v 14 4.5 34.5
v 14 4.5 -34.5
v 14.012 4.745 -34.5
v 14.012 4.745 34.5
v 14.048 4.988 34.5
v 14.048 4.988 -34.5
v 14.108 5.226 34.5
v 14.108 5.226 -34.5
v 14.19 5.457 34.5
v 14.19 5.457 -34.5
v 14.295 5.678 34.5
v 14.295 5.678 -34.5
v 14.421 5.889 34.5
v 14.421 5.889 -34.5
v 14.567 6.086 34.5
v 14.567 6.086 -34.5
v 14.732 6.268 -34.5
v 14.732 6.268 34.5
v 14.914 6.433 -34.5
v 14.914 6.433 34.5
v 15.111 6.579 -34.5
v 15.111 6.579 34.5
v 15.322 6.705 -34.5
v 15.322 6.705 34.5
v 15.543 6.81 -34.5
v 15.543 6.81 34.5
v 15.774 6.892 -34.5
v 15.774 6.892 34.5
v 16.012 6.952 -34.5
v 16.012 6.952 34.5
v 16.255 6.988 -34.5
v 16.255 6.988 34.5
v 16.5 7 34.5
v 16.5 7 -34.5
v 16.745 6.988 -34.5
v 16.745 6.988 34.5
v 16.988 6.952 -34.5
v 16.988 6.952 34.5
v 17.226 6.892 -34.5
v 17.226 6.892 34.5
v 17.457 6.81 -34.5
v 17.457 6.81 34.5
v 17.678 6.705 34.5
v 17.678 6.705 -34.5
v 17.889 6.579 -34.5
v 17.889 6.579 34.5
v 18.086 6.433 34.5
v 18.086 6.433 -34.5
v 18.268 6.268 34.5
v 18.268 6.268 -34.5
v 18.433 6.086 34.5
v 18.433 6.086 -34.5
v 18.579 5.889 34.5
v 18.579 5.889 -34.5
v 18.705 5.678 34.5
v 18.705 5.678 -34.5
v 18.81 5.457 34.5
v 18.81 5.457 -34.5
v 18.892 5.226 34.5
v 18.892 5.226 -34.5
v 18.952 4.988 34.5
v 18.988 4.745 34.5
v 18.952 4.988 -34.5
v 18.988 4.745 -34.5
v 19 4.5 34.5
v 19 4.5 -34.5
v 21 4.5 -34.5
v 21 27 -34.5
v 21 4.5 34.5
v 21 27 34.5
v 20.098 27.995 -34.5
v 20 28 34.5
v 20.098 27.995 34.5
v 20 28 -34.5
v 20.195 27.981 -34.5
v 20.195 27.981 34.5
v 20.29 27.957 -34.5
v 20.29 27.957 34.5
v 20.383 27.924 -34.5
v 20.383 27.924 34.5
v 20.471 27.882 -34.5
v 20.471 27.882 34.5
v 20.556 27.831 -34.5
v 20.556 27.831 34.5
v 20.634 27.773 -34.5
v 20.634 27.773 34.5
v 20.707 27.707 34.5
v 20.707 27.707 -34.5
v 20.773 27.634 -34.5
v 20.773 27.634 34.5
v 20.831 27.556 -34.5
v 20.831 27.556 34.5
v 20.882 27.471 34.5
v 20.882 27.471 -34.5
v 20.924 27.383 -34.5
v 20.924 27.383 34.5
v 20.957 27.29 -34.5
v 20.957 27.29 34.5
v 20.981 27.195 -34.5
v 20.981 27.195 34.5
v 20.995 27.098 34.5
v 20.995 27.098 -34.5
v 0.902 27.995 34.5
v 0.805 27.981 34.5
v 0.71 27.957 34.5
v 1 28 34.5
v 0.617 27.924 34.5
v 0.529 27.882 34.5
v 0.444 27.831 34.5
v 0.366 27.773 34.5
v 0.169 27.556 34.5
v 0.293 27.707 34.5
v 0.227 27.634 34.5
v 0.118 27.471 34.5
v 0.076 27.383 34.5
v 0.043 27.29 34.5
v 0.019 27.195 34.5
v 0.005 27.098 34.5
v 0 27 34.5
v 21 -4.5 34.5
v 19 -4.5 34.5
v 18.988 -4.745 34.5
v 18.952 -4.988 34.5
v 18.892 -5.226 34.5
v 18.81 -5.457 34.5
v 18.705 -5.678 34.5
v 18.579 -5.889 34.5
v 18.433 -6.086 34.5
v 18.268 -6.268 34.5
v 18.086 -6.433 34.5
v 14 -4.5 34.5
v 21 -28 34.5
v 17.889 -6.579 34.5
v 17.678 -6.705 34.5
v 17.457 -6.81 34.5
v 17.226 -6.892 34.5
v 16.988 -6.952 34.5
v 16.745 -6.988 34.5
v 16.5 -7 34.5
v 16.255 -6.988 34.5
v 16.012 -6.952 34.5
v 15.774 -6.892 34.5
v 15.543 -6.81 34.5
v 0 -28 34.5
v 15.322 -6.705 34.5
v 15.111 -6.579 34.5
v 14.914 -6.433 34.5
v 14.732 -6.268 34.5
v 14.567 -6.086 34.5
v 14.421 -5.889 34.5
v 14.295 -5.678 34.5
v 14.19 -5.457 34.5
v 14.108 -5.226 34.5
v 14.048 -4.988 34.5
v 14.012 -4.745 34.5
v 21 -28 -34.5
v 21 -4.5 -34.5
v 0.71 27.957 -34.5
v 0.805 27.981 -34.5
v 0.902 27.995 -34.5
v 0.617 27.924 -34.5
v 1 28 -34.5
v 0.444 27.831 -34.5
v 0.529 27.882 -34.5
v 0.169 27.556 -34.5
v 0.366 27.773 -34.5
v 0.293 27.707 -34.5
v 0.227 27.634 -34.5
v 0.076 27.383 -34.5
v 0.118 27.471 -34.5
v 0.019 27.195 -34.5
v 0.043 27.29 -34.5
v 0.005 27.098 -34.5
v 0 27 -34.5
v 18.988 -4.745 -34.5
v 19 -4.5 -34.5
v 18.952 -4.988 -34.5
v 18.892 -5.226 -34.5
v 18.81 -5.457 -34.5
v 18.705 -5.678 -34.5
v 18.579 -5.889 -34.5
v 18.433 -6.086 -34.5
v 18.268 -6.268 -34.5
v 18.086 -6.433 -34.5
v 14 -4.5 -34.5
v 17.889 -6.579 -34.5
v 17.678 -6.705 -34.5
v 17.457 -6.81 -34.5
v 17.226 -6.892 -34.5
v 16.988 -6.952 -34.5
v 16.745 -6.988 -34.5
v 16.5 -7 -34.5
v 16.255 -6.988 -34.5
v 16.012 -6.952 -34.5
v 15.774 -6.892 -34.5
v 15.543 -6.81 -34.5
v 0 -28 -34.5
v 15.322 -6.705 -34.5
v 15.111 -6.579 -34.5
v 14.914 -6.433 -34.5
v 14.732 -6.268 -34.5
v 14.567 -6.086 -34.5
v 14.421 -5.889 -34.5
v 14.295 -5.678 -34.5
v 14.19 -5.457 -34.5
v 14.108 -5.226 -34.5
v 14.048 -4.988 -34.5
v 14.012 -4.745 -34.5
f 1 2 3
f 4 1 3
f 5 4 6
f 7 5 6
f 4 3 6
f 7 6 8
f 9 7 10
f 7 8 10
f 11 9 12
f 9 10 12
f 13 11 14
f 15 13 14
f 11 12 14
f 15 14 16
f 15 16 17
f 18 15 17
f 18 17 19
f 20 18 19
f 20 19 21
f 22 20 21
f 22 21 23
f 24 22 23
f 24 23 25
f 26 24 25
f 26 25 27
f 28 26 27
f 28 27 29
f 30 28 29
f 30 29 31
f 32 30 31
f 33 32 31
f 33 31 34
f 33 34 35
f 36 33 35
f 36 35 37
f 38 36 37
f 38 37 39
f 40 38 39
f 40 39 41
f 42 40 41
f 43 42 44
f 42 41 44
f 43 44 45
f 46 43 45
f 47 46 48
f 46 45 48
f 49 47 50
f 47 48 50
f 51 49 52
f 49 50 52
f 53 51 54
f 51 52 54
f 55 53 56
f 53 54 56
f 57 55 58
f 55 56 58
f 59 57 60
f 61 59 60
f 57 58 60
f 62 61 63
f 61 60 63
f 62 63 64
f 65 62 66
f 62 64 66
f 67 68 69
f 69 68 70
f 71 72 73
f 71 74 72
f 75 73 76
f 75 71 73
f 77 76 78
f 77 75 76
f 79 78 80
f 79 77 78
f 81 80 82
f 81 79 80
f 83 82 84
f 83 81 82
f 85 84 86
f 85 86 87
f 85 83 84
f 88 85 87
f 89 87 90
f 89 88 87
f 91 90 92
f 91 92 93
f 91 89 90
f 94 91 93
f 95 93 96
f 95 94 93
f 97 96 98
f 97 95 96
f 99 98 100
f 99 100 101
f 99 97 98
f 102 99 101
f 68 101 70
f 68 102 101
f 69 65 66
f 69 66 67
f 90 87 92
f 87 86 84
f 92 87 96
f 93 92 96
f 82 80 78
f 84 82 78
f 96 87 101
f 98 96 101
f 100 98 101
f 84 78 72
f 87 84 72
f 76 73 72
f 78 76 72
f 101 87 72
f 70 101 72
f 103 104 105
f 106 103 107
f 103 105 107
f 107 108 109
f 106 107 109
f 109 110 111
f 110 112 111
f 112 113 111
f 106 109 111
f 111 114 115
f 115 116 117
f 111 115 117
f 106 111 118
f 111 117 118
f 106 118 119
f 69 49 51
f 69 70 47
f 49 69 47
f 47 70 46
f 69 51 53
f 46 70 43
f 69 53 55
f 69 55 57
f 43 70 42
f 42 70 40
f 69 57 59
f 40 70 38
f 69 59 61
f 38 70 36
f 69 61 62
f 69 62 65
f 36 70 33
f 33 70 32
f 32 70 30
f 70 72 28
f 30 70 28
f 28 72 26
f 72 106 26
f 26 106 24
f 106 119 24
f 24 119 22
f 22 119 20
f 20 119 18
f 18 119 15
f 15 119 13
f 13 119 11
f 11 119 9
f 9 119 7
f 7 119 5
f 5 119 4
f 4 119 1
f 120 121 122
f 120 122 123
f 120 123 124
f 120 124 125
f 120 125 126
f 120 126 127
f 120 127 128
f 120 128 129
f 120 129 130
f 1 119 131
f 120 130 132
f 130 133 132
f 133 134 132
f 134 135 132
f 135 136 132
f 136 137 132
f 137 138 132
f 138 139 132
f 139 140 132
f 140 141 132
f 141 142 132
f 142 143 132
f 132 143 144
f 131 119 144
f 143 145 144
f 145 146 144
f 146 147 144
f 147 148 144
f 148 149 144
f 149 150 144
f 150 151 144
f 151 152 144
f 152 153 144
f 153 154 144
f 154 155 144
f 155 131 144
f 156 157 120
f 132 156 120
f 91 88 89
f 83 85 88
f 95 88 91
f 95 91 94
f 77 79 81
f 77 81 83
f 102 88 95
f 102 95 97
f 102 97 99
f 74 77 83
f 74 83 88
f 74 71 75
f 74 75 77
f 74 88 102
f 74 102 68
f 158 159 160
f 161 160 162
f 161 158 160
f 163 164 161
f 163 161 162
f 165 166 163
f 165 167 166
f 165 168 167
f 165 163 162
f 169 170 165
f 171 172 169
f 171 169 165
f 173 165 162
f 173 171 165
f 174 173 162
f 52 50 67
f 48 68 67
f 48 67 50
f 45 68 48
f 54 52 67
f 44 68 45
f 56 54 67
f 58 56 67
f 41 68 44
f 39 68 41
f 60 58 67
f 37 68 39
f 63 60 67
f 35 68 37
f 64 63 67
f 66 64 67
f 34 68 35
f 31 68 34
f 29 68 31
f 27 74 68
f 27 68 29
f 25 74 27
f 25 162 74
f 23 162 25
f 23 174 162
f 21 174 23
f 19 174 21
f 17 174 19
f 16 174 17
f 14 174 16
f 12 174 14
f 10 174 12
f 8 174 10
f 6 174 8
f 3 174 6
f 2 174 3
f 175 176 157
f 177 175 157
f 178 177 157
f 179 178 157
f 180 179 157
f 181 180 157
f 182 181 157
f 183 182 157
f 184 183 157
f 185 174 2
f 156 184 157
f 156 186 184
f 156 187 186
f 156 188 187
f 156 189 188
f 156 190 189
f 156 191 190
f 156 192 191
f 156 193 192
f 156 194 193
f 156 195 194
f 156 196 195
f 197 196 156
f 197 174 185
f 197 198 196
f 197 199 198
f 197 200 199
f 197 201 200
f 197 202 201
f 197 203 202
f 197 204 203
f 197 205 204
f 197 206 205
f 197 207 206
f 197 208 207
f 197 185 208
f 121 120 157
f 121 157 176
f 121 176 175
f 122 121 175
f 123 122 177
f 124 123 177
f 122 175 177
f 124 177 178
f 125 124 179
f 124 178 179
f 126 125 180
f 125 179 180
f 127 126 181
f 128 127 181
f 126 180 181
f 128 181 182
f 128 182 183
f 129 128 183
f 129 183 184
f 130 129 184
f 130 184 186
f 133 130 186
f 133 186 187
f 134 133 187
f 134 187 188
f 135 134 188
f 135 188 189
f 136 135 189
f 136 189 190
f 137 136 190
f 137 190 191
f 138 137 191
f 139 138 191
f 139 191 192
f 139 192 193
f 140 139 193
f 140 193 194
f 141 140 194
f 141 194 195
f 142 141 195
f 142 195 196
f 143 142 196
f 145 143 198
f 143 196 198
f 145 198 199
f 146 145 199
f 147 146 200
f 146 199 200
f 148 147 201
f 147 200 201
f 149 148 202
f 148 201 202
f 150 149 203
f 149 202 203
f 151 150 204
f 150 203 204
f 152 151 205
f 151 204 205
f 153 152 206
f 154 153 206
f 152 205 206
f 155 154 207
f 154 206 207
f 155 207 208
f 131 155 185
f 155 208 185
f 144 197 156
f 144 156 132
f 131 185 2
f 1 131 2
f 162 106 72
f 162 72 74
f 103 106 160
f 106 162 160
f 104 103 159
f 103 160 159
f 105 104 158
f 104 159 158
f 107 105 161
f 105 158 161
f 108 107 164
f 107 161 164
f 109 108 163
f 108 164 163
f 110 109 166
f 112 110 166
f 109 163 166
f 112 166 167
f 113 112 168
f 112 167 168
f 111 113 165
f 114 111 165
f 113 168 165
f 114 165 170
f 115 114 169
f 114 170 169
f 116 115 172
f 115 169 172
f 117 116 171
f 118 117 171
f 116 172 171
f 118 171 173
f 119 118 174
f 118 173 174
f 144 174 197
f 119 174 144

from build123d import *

# Parameters (mm, degrees)
BOSS_EXTRUDE1_DEPTH = 21
FILLET1_R           = 1
CUT_EXTRUDE1_DEPTH  = 78.369244536


with BuildPart() as part:
    # Sketch1 → Boss-Extrude1 (new body)
    with BuildSketch(Plane(origin=(0, 0, 0), x_dir=(0, 0, -1), z_dir=(1, 0, 0))):
        Polygon((-34.5, 0), (-34.5, 28), (34.5, 28), (34.5, -28), (-34.5, -28), align=None)
    extrude(amount=BOSS_EXTRUDE1_DEPTH)

    # Fillet1
    fillet1_edges = [part.edges().sort_by_distance(p)[0] for p in [
        (21, 28, 0),
        (0, 28, 0),
    ]]
    fillet(fillet1_edges, radius=FILLET1_R)

    # Sketch2 → Cut-Extrude1 (cut, through all)
    with BuildSketch(Plane(origin=(0, 0, -34.5), x_dir=(-1, 0, 0), z_dir=(0, 0, -1))):
        with BuildLine():
            Line((-21, -4.5), (-19, -4.5))
            ThreePointArc((-19, -4.5), (-16.5, -7), (-14, -4.5))
            Line((-14, -4.5), (-14, 4.5))
            ThreePointArc((-14, 4.5), (-16.5, 7), (-19, 4.5))
            Line((-19, 4.5), (-21, 4.5))
            Line((-21, 4.5), (-21, -4.5))
        make_face()
    extrude(amount=-CUT_EXTRUDE1_DEPTH, mode=Mode.SUBTRACT)


solid = part.part
